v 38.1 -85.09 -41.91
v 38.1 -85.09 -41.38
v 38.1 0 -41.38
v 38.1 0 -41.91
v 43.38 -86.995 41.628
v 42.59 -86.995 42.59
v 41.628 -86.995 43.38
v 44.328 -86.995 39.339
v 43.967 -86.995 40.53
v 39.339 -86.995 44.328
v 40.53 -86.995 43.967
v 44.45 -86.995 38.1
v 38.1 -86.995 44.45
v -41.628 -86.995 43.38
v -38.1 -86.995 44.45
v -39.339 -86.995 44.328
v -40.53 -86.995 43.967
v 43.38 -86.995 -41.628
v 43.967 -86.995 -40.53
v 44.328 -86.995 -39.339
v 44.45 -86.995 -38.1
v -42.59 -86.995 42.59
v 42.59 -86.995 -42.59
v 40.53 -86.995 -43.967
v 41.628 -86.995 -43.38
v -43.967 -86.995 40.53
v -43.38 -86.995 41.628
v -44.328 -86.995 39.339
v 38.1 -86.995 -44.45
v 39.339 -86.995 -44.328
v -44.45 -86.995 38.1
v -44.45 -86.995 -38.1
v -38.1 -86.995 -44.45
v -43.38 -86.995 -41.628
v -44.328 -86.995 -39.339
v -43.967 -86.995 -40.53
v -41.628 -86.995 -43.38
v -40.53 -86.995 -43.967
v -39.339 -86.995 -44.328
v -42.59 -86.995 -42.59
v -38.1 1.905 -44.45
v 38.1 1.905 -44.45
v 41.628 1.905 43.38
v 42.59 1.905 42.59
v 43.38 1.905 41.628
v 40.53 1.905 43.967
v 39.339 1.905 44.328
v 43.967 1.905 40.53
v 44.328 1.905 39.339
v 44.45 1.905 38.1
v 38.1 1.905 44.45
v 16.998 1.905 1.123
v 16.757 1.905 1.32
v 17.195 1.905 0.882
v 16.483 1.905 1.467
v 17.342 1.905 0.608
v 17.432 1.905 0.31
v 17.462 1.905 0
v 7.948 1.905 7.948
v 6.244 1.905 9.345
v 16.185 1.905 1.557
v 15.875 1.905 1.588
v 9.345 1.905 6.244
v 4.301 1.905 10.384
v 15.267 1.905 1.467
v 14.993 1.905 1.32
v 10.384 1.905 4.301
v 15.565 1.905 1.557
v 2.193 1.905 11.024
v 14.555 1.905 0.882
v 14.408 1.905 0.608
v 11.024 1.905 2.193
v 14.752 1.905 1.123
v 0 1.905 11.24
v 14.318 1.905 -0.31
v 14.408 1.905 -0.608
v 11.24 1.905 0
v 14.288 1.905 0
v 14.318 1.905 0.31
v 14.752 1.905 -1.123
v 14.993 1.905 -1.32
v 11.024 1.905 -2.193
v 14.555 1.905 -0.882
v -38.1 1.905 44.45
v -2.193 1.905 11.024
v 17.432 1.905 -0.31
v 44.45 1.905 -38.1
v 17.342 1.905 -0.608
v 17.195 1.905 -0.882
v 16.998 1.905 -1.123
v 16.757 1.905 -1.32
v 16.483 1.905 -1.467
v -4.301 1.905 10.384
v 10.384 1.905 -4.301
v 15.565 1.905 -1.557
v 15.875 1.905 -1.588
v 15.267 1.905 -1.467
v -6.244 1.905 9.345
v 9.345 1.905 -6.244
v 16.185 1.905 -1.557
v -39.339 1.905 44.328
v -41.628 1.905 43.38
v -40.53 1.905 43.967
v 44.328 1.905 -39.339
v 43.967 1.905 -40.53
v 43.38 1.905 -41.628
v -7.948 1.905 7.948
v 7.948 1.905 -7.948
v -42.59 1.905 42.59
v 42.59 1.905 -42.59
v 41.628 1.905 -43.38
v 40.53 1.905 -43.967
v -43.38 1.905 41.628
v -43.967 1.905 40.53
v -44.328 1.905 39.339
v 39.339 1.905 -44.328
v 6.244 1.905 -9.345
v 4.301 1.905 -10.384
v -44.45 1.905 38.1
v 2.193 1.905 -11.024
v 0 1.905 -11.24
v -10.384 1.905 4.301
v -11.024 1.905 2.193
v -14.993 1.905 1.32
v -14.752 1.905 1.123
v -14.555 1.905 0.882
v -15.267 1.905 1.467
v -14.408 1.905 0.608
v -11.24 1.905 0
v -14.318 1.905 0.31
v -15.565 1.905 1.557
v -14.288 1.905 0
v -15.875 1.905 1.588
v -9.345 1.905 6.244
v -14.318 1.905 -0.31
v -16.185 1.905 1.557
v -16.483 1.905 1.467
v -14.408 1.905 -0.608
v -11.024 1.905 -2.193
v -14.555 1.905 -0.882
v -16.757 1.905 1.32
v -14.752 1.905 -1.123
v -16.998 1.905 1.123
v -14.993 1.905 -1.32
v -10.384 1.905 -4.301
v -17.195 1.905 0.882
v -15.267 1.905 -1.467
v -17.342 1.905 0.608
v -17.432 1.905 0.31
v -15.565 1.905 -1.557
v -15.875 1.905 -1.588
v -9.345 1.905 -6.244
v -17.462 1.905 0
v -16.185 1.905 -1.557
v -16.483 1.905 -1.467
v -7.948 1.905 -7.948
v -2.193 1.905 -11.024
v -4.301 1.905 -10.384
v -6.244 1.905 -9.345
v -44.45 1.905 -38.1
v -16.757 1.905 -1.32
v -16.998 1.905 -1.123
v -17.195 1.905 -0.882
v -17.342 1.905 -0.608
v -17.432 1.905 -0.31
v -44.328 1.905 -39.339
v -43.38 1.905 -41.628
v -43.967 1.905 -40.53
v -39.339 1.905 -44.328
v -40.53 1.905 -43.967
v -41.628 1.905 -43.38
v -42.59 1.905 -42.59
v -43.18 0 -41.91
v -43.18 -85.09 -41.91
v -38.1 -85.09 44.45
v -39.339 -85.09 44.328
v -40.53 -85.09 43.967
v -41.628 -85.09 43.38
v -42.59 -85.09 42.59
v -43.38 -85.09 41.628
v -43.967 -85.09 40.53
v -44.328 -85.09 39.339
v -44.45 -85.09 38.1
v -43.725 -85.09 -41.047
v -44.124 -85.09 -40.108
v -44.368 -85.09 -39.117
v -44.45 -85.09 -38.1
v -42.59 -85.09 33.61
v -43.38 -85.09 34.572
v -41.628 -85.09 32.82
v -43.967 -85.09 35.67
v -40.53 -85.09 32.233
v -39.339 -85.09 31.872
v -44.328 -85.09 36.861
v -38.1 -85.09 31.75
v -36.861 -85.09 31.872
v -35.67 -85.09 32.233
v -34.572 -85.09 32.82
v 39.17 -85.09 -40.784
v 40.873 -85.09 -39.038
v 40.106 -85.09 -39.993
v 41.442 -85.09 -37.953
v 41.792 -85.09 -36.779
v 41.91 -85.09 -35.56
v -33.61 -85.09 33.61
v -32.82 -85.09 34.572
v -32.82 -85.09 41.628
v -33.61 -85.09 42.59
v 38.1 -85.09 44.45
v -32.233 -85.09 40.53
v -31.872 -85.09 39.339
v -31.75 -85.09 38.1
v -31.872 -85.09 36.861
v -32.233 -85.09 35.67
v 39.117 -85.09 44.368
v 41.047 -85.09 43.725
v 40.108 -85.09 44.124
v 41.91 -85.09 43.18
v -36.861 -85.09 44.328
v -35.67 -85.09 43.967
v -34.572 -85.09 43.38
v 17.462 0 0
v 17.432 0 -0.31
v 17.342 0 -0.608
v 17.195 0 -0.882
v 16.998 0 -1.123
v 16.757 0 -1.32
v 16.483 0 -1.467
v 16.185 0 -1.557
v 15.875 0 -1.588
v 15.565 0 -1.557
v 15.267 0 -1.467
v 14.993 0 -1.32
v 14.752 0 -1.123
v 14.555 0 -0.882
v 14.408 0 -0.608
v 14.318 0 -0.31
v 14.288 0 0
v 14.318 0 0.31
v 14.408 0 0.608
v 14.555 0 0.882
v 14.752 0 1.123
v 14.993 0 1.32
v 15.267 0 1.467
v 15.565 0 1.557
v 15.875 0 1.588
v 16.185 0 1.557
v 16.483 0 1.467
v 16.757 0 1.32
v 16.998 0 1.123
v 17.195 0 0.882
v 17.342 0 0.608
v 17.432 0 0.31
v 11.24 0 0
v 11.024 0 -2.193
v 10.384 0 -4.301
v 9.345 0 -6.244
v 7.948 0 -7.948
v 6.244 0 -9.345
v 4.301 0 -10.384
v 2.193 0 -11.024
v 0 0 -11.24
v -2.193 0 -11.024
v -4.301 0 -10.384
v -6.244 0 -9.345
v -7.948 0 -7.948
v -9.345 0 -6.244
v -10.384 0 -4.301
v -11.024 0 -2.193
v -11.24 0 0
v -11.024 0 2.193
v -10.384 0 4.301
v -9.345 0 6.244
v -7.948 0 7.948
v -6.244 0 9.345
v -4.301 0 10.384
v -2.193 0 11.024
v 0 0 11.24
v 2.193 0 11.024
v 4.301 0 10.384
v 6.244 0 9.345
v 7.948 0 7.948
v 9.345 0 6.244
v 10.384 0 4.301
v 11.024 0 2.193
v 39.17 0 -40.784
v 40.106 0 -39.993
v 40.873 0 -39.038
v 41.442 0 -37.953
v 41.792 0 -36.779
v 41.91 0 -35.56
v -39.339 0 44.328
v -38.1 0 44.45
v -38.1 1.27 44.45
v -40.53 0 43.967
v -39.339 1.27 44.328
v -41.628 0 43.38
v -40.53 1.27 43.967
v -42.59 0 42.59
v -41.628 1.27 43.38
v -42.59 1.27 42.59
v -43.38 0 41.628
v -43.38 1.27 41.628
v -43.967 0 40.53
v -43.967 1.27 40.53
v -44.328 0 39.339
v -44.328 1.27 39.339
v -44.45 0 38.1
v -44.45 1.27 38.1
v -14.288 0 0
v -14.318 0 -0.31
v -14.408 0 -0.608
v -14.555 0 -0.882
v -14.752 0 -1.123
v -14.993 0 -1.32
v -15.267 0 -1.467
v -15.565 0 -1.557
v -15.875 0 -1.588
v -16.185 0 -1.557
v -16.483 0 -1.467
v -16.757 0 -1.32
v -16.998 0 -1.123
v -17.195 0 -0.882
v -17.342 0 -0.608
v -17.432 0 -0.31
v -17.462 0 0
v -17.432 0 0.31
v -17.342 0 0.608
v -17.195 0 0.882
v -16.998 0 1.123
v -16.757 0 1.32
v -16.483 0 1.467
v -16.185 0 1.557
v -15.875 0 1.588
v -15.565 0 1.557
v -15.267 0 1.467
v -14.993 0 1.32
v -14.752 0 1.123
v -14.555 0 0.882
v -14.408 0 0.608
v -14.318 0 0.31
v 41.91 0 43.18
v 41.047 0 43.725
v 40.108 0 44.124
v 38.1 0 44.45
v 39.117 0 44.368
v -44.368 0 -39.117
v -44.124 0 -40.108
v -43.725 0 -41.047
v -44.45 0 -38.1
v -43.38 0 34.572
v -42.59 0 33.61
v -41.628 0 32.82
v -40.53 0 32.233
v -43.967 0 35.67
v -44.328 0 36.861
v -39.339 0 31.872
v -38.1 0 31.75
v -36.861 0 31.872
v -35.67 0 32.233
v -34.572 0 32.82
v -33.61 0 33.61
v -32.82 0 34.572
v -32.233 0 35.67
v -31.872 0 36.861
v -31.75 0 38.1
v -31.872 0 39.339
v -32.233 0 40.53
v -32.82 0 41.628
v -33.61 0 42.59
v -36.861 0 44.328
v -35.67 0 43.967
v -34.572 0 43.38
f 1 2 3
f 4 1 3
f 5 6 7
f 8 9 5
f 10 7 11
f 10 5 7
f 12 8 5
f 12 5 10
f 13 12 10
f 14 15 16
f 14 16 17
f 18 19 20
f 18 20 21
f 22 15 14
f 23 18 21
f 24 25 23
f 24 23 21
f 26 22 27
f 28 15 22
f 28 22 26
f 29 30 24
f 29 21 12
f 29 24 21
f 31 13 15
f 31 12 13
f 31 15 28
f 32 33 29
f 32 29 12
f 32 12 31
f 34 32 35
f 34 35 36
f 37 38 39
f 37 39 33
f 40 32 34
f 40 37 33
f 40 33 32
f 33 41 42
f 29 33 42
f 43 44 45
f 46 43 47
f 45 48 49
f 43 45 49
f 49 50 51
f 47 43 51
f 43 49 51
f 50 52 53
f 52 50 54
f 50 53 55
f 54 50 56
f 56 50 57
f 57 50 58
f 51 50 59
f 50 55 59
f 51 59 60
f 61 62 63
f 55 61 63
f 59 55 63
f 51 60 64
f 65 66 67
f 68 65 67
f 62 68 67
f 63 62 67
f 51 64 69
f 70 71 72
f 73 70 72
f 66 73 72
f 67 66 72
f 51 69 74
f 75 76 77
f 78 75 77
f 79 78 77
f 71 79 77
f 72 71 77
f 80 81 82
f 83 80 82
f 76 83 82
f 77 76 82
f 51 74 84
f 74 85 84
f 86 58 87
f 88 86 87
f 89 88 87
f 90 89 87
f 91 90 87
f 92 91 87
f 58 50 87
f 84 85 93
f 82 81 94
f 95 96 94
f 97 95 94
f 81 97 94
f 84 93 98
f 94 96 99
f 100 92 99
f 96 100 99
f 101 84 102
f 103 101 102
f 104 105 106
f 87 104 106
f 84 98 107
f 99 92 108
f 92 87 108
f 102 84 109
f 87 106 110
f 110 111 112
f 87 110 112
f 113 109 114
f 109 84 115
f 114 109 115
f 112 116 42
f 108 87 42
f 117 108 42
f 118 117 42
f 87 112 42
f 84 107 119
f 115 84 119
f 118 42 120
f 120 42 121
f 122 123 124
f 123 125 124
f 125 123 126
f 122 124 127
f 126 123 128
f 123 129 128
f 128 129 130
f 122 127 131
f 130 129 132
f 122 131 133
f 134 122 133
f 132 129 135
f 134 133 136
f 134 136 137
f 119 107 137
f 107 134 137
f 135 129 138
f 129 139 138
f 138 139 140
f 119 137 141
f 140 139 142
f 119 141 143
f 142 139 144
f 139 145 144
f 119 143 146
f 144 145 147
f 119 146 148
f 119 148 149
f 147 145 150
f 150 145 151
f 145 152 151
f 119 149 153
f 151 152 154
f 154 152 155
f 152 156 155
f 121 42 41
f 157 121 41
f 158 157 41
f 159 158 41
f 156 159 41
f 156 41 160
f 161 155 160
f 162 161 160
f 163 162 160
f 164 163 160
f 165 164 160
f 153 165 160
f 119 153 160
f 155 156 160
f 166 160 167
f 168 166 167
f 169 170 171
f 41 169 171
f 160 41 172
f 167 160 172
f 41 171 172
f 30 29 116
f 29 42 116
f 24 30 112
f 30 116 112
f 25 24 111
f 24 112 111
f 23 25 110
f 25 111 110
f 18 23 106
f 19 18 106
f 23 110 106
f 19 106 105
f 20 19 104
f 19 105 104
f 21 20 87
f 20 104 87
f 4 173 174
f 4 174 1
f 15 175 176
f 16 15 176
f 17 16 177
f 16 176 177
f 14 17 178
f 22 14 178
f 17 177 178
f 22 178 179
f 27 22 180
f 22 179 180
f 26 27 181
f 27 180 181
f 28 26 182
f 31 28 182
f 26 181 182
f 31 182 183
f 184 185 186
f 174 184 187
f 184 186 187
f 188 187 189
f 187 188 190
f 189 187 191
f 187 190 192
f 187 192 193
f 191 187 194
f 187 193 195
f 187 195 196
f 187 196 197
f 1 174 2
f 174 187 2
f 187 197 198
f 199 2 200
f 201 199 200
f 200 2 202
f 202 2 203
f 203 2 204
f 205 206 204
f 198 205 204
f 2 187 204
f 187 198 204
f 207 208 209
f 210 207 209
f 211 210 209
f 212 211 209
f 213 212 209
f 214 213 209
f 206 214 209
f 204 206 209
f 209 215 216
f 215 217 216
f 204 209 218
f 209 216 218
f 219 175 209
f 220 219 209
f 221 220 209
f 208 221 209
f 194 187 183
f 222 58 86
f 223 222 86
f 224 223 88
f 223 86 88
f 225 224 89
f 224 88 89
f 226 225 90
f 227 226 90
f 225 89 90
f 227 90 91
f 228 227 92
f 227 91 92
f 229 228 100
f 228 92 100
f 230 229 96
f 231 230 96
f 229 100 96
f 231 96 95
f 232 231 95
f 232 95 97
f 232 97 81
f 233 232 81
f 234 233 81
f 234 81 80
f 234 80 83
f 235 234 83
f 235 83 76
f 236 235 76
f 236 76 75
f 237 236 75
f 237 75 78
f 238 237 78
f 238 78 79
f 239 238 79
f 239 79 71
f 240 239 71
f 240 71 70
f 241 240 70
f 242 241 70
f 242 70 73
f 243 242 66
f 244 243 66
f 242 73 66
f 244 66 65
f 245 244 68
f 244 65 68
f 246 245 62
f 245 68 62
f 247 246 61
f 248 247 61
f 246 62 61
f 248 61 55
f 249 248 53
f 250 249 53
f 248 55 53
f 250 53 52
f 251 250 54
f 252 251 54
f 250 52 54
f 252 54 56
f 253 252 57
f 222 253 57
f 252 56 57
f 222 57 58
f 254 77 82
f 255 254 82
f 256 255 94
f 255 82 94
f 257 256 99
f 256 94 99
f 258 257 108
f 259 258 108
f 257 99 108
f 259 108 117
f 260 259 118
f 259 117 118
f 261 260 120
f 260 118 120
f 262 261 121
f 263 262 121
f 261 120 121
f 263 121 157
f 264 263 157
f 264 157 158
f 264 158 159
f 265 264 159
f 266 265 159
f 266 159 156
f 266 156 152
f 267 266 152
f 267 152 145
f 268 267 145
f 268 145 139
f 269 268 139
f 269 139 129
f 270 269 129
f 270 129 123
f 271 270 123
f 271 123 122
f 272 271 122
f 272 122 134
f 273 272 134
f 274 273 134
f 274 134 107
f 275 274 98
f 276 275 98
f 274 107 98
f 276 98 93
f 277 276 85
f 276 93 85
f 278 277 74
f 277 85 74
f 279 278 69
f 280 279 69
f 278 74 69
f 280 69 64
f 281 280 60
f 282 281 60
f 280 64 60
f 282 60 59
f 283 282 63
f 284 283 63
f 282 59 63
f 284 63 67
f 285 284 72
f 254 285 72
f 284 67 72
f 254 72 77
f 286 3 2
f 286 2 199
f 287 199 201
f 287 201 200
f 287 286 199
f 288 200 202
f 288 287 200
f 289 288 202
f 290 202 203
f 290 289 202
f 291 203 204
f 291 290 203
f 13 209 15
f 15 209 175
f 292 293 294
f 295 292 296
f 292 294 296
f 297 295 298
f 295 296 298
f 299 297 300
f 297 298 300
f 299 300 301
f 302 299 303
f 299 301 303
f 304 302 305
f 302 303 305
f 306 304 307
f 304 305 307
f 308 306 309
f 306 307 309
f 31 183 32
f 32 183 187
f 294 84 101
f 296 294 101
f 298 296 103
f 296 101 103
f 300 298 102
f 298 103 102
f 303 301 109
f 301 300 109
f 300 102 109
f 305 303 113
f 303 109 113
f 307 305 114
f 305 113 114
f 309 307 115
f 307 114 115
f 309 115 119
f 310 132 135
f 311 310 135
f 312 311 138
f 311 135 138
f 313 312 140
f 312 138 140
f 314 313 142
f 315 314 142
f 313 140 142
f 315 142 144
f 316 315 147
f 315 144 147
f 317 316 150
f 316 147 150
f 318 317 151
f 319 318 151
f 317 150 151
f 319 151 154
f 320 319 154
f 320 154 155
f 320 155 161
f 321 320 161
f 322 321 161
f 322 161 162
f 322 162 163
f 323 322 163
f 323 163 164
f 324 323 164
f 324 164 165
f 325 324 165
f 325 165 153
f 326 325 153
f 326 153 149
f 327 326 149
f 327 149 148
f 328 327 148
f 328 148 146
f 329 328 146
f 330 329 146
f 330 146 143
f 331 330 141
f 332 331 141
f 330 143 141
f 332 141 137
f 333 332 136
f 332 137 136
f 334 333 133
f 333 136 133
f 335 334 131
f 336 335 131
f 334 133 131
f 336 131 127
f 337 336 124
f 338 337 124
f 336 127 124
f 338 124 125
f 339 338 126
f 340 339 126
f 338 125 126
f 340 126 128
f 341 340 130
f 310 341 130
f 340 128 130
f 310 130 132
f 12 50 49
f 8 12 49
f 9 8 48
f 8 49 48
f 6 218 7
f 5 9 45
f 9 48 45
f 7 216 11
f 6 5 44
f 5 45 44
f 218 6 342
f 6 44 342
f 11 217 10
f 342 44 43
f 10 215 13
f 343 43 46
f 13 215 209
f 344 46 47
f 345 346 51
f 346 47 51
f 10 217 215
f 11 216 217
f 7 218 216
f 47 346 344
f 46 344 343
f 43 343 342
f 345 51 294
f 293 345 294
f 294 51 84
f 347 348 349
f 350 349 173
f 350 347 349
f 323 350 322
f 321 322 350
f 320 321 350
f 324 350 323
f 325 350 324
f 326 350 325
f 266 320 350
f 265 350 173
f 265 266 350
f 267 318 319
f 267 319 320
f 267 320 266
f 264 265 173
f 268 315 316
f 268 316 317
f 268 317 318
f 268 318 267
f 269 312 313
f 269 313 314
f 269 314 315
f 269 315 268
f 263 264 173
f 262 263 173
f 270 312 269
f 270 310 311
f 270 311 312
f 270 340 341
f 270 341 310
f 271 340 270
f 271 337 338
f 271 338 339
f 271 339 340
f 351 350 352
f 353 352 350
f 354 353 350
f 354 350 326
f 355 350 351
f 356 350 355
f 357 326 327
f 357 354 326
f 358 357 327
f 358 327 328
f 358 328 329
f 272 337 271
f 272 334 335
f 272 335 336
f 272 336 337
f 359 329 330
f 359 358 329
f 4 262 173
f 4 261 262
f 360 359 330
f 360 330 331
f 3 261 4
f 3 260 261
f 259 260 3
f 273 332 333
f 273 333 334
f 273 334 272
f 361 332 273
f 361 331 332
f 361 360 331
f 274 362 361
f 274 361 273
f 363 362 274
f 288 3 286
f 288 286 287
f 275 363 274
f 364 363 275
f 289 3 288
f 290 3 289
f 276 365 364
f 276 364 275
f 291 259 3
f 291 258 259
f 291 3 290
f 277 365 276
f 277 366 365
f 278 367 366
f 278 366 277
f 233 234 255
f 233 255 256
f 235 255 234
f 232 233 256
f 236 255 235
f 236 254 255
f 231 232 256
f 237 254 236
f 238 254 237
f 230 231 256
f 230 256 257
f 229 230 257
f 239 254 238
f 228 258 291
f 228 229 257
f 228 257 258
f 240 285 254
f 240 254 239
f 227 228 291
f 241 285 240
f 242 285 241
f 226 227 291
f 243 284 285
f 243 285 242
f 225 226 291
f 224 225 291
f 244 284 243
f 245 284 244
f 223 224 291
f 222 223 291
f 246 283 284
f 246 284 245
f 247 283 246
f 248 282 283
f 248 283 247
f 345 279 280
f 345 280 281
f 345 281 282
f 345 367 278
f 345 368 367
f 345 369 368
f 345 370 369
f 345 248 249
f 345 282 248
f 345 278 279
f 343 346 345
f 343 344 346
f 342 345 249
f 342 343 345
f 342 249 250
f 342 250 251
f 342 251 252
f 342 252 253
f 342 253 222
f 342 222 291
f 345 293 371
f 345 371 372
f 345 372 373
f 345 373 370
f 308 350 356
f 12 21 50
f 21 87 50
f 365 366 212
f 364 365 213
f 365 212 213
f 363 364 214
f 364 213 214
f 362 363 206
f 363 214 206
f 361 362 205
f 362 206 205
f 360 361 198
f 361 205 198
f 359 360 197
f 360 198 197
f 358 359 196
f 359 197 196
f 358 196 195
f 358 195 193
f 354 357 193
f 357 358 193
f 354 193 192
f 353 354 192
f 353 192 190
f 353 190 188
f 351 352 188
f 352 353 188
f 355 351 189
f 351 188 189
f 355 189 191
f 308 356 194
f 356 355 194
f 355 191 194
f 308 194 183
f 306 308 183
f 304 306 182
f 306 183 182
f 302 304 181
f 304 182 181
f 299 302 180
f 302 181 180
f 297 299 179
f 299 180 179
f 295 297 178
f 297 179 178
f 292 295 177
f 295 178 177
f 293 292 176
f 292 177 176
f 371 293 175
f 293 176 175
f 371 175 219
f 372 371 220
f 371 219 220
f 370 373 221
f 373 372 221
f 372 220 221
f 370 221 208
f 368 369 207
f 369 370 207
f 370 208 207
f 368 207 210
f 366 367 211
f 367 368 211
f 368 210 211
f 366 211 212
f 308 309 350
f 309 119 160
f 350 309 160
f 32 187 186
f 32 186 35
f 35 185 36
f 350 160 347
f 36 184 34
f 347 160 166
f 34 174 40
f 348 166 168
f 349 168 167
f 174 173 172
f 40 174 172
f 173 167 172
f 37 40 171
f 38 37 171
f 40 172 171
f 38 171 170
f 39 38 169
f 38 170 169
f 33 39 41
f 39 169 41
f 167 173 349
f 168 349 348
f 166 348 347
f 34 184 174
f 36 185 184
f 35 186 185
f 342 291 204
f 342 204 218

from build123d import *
from build123d.topology import SkipClean

# Parameters (mm, degrees)
BOSS_EXTRUDE3_DEPTH = 1.905
BOSS_EXTRUDE4_START = -86.995
BOSS_EXTRUDE4_DEPTH = 86.995
CUT_EXTRUDE2_DEPTH  = 85.09
SKETCH16_W          = 82.55
SKETCH16_H          = 85.09
CUT_EXTRUDE3_DEPTH  = 86.36
SKETCH18_W          = 80.01
SKETCH18_H          = 85.09
CUT_EXTRUDE4_DEPTH  = 86.36
SKETCH19_R          = 6.35
BOSS_EXTRUDE5_DEPTH = 86.36
CUT_EXTRUDE5_REACH  = 110.88
SKETCH20_R          = 11.2395
SKETCH20_R_2        = 1.5875


with BuildPart() as part:
    # Sketch7 → Boss-Extrude3 (new body)
    with BuildSketch(Plane(origin=(0, 0, 0), x_dir=(1, 0, 0), z_dir=(0, 1, 0))):
        with BuildLine():
            Line((-38.1, 44.45), (38.1, 44.45))
            ThreePointArc((38.1, 44.45), (42.590128061, 42.590128061), (44.45, 38.1))
            Line((44.45, 38.1), (44.45, -38.1))
            ThreePointArc((44.45, -38.1), (42.590128061, -42.590128061), (38.1, -44.45))
            Line((38.1, -44.45), (-38.1, -44.45))
            ThreePointArc((-38.1, -44.45), (-42.590128061, -42.590128061), (-44.45, -38.1))
            Line((-44.45, -38.1), (-44.45, 38.1))
            ThreePointArc((-44.45, 38.1), (-42.590128061, 42.590128061), (-38.1, 44.45))
        make_face()
    extrude(amount=BOSS_EXTRUDE3_DEPTH)

    # Sketch7<2> → Boss-Extrude4 (add)
    with BuildSketch(Plane(origin=(0, 0, 0), x_dir=(1, 0, 0), z_dir=(0, 1, 0)).offset(BOSS_EXTRUDE4_START)):
        with BuildLine():
            Line((-38.1, 44.45), (38.1, 44.45))
            ThreePointArc((38.1, 44.45), (42.590128061, 42.590128061), (44.45, 38.1))
            Line((44.45, 38.1), (44.45, -38.1))
            ThreePointArc((44.45, -38.1), (42.590128061, -42.590128061), (38.1, -44.45))
            Line((38.1, -44.45), (-38.1, -44.45))
            ThreePointArc((-38.1, -44.45), (-42.590128061, -42.590128061), (-44.45, -38.1))
            Line((-44.45, -38.1), (-44.45, 38.1))
            ThreePointArc((-44.45, 38.1), (-42.590128061, 42.590128061), (-38.1, 44.45))
        make_face()
    extrude(amount=BOSS_EXTRUDE4_DEPTH)

    # Sketch15 → Cut-Extrude2 (cut)
    with BuildSketch(Plane(origin=(0, 0, 0), x_dir=(1, 0, 0), z_dir=(0, 1, 0))):
        with BuildLine():
            Line((-35.56, 41.91), (35.56, 41.91))
            ThreePointArc((35.56, 41.91), (40.050128061, 40.050128061), (41.91, 35.56))
            Line((41.91, 35.56), (41.91, -35.56))
            ThreePointArc((41.91, -35.56), (40.050128061, -40.050128061), (35.56, -41.91))
            Line((35.56, -41.91), (-35.56, -41.91))
            ThreePointArc((-35.56, -41.91), (-40.050128061, -40.050128061), (-41.91, -35.56))
            Line((-41.91, -35.56), (-41.91, 35.56))
            ThreePointArc((-41.91, 35.56), (-40.050128061, 40.050128061), (-35.56, 41.91))
        make_face()
    extrude(amount=-CUT_EXTRUDE2_DEPTH, mode=Mode.SUBTRACT)

    # Sketch16 → Cut-Extrude3 (cut)
    with BuildSketch(Plane.XY.offset(44.45)):
        with Locations((-3.175, -42.545)):
            Rectangle(SKETCH16_W, SKETCH16_H)
    extrude(amount=-CUT_EXTRUDE3_DEPTH, mode=Mode.SUBTRACT)

    # Sketch18 → Cut-Extrude4 (cut)
    with BuildSketch(Plane.ZY.offset(-41.91)):
        with Locations((4.445, -42.545)):
            Rectangle(SKETCH18_W, SKETCH18_H)
    extrude(amount=CUT_EXTRUDE4_DEPTH, mode=Mode.SUBTRACT)

    # Sketch19 → Boss-Extrude5 (add)
    with SkipClean():  # the faces are left unmerged after this step: merging them gives an invalid solid
        with BuildSketch(Plane(origin=(0, -85.09, 0), x_dir=(1, 0, 0), z_dir=(0, 1, 0))):
            with Locations((-38.1, -38.1)):
                Circle(SKETCH19_R)
        extrude(amount=BOSS_EXTRUDE5_DEPTH)

    # Sketch20 → Cut-Extrude5 (cut, up to next)
    with BuildSketch(Plane(origin=(0, 1.905, 0), x_dir=(1, 0, 0), z_dir=(0, 1, 0)), mode=Mode.PRIVATE) as cut_extrude5_sk1:
        Circle(SKETCH20_R)
    cut_extrude5_tool1 = extrude(cut_extrude5_sk1.sketch, amount=-CUT_EXTRUDE5_REACH, mode=Mode.PRIVATE) & part.part
    # Sketch20 → Cut-Extrude5 (cut, up to next)
    with BuildSketch(Plane(origin=(0, 1.905, 0), x_dir=(1, 0, 0), z_dir=(0, 1, 0)), mode=Mode.PRIVATE) as cut_extrude5_sk2:
        with Locations((-15.875, 0)):
            Circle(SKETCH20_R_2)
    cut_extrude5_tool2 = extrude(cut_extrude5_sk2.sketch, amount=-CUT_EXTRUDE5_REACH, mode=Mode.PRIVATE) & part.part
    # Sketch20 → Cut-Extrude5 (cut, up to next)
    with BuildSketch(Plane(origin=(0, 1.905, 0), x_dir=(1, 0, 0), z_dir=(0, 1, 0)), mode=Mode.PRIVATE) as cut_extrude5_sk3:
        with Locations((15.875, 0)):
            Circle(SKETCH20_R_2)
    cut_extrude5_tool3 = extrude(cut_extrude5_sk3.sketch, amount=-CUT_EXTRUDE5_REACH, mode=Mode.PRIVATE) & part.part
    add(cut_extrude5_tool1.solids().sort_by_distance((0, 1.905, 0))[0], mode=Mode.SUBTRACT)
    add(cut_extrude5_tool2.solids().sort_by_distance((-15.875, 1.905, 0))[0], mode=Mode.SUBTRACT)
    add(cut_extrude5_tool3.solids().sort_by_distance((15.875, 1.905, 0))[0], mode=Mode.SUBTRACT)


solid = part.part
